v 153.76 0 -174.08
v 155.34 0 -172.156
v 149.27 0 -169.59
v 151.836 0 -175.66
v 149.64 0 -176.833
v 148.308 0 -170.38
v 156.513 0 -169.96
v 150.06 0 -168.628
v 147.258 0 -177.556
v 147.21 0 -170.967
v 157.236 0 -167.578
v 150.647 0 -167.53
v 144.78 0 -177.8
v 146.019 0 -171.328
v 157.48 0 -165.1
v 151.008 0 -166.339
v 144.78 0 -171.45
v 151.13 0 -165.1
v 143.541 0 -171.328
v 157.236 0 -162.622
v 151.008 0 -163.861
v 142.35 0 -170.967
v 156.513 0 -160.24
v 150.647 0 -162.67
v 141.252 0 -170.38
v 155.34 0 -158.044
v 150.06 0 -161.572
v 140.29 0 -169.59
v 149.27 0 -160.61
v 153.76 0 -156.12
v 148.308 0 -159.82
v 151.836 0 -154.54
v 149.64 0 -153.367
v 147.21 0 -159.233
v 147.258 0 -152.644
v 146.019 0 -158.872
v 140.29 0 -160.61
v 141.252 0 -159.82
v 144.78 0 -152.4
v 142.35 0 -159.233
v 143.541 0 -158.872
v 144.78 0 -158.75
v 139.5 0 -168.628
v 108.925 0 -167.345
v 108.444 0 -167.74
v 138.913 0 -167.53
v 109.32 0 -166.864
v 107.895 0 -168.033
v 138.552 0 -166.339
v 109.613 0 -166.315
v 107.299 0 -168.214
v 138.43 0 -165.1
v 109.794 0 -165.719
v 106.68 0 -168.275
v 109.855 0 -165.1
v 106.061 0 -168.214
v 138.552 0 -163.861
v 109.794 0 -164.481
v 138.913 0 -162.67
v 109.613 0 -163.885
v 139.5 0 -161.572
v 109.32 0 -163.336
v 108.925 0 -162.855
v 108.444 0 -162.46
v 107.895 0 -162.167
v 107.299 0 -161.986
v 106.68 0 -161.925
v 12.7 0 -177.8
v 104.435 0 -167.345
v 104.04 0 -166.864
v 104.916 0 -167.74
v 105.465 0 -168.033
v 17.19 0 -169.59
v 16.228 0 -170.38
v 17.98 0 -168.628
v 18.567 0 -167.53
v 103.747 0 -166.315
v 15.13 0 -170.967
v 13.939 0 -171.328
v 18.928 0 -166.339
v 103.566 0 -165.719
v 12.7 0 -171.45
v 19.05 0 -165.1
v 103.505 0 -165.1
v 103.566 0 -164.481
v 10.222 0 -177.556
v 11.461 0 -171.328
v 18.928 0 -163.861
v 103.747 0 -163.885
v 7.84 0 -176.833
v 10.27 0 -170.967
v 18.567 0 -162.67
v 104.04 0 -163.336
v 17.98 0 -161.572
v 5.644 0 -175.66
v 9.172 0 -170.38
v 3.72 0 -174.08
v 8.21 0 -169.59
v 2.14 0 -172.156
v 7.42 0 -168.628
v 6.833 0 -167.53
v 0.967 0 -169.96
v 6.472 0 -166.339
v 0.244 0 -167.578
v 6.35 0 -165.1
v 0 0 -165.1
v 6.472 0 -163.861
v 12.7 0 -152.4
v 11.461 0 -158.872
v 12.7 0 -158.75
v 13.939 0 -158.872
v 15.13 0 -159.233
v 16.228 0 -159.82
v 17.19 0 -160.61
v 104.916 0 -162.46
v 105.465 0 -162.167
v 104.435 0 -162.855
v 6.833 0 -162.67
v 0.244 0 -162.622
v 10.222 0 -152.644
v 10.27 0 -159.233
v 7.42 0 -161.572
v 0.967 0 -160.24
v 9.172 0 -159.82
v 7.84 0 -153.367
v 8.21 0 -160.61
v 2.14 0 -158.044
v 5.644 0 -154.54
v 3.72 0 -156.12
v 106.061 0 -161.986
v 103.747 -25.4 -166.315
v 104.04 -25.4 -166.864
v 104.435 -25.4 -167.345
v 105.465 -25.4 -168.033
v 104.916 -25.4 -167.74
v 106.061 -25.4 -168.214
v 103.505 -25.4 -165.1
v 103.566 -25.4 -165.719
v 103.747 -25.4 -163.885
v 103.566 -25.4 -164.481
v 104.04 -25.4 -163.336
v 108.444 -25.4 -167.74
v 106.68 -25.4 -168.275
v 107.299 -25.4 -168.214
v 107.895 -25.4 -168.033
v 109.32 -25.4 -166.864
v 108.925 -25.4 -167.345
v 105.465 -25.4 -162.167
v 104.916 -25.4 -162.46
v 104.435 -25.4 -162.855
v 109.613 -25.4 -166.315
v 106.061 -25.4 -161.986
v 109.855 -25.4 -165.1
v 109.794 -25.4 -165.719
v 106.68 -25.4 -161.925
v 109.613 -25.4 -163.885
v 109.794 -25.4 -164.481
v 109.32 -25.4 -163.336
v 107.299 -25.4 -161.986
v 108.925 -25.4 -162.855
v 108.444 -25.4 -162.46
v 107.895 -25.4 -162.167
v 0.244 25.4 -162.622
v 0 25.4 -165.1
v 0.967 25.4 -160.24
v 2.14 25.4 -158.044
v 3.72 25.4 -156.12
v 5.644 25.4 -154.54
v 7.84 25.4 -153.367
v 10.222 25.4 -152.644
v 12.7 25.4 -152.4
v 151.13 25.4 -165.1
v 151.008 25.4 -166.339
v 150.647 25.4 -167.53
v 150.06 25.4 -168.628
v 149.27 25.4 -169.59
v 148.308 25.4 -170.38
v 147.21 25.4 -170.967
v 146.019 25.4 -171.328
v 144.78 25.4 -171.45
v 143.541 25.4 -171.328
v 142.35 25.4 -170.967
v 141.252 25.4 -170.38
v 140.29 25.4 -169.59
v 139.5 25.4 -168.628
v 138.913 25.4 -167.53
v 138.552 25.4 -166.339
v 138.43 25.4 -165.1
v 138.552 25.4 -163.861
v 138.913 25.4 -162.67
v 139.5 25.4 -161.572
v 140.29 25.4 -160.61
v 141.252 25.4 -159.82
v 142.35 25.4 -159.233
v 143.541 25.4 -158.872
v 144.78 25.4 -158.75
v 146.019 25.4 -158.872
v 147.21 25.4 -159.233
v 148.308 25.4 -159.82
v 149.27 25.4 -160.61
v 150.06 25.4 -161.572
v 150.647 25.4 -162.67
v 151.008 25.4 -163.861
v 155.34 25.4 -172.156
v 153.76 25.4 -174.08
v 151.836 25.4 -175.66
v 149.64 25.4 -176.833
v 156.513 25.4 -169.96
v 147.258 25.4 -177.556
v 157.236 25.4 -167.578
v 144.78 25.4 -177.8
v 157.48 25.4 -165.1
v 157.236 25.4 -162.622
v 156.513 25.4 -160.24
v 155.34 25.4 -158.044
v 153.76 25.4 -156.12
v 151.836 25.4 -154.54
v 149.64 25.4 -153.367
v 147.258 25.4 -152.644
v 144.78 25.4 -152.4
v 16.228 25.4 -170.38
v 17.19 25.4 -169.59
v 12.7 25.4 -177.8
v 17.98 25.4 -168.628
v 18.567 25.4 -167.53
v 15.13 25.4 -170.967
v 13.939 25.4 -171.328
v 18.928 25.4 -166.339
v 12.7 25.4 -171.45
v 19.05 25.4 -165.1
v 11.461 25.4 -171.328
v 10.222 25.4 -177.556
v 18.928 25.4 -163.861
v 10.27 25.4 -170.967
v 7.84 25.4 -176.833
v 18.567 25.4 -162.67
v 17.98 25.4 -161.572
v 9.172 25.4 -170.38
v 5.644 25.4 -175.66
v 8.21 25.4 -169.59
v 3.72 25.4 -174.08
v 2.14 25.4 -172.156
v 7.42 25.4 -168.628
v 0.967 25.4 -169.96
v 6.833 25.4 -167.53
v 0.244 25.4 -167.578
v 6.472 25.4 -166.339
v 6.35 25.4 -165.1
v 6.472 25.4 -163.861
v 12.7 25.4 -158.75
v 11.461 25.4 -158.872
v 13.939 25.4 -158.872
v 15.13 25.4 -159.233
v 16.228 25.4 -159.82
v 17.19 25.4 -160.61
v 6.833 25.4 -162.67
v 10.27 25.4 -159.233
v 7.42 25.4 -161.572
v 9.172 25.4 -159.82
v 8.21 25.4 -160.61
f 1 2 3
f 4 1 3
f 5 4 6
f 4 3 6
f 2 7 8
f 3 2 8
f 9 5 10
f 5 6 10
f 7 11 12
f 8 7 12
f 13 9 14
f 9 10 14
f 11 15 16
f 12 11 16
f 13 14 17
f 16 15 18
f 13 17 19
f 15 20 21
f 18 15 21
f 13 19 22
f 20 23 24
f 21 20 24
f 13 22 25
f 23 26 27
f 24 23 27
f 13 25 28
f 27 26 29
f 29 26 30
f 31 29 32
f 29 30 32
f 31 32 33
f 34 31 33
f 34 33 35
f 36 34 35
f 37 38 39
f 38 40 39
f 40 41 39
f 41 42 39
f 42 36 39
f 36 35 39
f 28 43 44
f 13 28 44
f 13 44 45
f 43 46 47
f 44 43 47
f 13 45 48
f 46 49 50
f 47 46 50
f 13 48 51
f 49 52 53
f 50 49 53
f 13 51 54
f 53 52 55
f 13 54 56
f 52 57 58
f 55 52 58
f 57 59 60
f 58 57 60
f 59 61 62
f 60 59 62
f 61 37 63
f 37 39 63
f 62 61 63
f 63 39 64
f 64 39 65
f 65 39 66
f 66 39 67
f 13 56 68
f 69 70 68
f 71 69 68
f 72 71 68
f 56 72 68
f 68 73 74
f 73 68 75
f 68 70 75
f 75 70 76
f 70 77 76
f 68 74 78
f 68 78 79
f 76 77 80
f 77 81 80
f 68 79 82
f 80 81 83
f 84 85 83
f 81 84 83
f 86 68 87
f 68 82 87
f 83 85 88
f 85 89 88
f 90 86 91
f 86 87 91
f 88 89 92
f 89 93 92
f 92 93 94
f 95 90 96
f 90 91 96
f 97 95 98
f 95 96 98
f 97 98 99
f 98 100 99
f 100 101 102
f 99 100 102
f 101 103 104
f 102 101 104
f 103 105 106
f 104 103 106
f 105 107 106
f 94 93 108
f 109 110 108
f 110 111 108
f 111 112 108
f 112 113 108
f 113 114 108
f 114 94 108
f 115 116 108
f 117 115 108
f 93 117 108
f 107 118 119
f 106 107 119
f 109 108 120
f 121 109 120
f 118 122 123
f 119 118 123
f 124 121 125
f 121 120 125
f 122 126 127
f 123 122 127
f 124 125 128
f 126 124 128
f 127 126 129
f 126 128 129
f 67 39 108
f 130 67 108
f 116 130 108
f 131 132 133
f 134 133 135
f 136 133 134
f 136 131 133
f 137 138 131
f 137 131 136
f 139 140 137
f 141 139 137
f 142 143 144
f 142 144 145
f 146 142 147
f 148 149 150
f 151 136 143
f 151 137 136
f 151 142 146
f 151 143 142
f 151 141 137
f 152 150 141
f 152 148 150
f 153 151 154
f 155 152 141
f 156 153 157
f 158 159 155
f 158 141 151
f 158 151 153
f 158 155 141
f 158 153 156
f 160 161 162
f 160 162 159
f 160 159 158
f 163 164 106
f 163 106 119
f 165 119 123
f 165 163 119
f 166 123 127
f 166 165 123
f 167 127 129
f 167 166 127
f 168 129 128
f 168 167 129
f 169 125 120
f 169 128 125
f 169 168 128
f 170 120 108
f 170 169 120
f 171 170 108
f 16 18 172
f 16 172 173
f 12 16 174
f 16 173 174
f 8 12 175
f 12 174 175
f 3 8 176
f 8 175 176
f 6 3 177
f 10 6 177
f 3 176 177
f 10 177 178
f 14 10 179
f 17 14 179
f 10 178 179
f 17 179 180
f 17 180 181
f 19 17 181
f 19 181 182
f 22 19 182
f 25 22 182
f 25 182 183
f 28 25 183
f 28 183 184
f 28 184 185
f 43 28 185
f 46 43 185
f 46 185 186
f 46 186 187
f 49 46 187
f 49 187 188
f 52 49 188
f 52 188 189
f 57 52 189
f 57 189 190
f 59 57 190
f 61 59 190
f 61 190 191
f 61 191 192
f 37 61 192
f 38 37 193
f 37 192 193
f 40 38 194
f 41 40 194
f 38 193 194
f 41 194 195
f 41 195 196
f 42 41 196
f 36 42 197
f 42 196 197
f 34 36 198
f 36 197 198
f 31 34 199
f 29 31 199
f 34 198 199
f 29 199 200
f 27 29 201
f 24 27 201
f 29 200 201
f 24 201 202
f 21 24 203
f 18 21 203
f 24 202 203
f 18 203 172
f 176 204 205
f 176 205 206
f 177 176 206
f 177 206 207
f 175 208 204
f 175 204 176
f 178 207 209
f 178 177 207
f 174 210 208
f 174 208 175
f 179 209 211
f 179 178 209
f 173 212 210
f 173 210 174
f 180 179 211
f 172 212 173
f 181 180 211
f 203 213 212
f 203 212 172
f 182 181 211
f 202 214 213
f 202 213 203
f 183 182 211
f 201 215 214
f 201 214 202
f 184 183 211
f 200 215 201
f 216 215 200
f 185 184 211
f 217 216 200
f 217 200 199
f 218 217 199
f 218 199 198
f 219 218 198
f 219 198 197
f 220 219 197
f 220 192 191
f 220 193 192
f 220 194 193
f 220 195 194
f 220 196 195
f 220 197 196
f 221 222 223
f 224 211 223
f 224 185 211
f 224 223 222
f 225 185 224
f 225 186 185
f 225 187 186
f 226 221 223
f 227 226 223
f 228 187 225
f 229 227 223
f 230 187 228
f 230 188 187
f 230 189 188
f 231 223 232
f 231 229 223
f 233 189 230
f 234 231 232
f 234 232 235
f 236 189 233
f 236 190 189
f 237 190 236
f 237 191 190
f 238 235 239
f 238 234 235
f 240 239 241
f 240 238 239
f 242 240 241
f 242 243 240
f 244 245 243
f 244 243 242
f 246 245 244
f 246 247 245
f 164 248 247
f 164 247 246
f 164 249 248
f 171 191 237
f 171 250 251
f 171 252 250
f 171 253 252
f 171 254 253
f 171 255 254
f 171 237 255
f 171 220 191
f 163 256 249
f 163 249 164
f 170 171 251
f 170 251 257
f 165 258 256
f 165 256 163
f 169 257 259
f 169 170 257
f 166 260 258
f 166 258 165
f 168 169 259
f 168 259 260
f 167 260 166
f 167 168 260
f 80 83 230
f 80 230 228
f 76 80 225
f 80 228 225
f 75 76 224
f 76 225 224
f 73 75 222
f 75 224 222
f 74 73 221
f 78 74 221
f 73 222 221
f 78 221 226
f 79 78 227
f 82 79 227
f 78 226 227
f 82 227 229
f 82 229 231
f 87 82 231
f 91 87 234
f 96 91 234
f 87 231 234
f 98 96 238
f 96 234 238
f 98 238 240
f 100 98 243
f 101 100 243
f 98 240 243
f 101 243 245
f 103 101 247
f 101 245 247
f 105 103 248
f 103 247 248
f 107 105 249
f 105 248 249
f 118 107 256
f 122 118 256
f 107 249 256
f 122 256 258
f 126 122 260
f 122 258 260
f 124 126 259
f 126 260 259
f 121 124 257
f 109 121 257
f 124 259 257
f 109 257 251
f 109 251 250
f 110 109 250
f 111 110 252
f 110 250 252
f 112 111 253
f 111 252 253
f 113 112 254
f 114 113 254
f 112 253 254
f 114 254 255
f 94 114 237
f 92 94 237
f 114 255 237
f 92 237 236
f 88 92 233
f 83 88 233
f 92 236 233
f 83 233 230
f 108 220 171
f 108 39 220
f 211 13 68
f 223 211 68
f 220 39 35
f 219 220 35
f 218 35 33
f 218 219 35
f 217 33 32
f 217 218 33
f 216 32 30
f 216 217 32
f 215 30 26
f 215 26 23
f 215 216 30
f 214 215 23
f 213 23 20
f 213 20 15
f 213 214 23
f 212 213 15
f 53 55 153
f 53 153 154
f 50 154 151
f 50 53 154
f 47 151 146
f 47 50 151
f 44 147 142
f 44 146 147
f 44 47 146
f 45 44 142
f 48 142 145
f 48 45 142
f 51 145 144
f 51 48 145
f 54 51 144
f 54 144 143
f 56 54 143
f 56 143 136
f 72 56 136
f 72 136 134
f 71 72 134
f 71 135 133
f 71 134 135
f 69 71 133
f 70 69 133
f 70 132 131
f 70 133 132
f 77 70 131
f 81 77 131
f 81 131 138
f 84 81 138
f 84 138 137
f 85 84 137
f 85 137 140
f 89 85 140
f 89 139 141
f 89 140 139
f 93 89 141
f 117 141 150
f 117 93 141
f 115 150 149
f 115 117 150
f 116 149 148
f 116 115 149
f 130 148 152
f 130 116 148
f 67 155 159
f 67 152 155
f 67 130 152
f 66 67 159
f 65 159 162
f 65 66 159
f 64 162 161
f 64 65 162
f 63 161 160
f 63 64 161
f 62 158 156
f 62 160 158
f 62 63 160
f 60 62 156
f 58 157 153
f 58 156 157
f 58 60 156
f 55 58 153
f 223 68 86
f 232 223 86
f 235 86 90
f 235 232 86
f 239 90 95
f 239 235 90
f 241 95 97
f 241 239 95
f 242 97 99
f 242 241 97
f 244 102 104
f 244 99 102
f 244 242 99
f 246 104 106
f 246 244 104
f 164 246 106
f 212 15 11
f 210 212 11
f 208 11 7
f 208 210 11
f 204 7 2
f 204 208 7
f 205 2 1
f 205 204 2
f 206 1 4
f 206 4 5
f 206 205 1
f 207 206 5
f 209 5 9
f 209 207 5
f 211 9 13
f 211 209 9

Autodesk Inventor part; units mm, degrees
ref_plane "YZ Plane" through (0, 0, 0) normal (1, 0, 0) x (0, 1, 0)
ref_plane "XZ Plane" through (0, 0, 0) normal (0, 1, 0) x (-1, 0, 0)
ref_plane "XY Plane" through (0, 0, 0) normal (0, 0, 1) x (1, 0, 0)
sketch "Sketch1" plane through (0, 0, 0) normal (0, 1, 0) x (-1, 0, 0)
  line L0 (0, 0) -> (-25.4, 0)
  line L1 (-25.4, -152.4) -> (-157.48, -152.4)
  line L2 (-157.48, -152.4) -> (-157.48, -177.8)
  line L3 (-157.48, -177.8) -> (0, -177.8)
  line L4 (0, -177.8) -> (0, -152.4)
  line L5 (-25.4, -152.4) -> (0, -152.4)
  dimension "d2" = 25.4
  dimension "d23" = 157.48
extrude "Extrusion1" add sketch "Sketch1" along normal blind 25.4
sketch "Sketch2" plane through (0, 25.4, 0) normal (0, 1, 0) x (1, 0, 0)
  circle A0 centre (144.78, 165.1) radius 6.35
  line L0 (157.48, 152.4) -> (157.48, 177.8) projected
  line L1 (157.48, 177.8) -> (0, 177.8) projected
  circle A1 centre (12.7, 165.1) radius 6.35
  line L2 (0, 152.4) -> (157.48, 152.4) projected
  line L3 (0, 177.8) -> (0, 152.4) projected
  point P0 (0, 0)
  dimension "d5" = 12.7
  dimension "d6" = 12.7
  dimension "d7" = 12.7
  dimension "d16" = 12.7
  dimension "d17" = 12.7
extrude "Extrusion2" cut sketch "Sketch2" against normal blind 41.275 contours A0 | A1
fillet "Fillet1" radius 12.7 4 edges at (157.48, 12.7, -152.4) (157.48, 12.7, -177.8) (0, 12.7, -152.4) (0, 12.7, -177.8)
sketch "Sketch4" plane through (0, 0, 0) normal (0, -1, 0) x (1, 0, 0)
  circle A0 centre (106.68, -165.1) radius 3.175
  line L0 (144.78, -177.8) -> (12.7, -177.8) projected
  circle A1 centre (144.78, -165.1) radius 6.35 projected
  point P0 (0, 0)
  dimension "d18" = 6.35
  dimension "d19" = 12.7
  dimension "d20" = 38.1
extrude "Extrusion4" add sketch "Sketch4" along normal blind 25.4 contours A0
properties part number "arm" material "Aluminum 6061"
